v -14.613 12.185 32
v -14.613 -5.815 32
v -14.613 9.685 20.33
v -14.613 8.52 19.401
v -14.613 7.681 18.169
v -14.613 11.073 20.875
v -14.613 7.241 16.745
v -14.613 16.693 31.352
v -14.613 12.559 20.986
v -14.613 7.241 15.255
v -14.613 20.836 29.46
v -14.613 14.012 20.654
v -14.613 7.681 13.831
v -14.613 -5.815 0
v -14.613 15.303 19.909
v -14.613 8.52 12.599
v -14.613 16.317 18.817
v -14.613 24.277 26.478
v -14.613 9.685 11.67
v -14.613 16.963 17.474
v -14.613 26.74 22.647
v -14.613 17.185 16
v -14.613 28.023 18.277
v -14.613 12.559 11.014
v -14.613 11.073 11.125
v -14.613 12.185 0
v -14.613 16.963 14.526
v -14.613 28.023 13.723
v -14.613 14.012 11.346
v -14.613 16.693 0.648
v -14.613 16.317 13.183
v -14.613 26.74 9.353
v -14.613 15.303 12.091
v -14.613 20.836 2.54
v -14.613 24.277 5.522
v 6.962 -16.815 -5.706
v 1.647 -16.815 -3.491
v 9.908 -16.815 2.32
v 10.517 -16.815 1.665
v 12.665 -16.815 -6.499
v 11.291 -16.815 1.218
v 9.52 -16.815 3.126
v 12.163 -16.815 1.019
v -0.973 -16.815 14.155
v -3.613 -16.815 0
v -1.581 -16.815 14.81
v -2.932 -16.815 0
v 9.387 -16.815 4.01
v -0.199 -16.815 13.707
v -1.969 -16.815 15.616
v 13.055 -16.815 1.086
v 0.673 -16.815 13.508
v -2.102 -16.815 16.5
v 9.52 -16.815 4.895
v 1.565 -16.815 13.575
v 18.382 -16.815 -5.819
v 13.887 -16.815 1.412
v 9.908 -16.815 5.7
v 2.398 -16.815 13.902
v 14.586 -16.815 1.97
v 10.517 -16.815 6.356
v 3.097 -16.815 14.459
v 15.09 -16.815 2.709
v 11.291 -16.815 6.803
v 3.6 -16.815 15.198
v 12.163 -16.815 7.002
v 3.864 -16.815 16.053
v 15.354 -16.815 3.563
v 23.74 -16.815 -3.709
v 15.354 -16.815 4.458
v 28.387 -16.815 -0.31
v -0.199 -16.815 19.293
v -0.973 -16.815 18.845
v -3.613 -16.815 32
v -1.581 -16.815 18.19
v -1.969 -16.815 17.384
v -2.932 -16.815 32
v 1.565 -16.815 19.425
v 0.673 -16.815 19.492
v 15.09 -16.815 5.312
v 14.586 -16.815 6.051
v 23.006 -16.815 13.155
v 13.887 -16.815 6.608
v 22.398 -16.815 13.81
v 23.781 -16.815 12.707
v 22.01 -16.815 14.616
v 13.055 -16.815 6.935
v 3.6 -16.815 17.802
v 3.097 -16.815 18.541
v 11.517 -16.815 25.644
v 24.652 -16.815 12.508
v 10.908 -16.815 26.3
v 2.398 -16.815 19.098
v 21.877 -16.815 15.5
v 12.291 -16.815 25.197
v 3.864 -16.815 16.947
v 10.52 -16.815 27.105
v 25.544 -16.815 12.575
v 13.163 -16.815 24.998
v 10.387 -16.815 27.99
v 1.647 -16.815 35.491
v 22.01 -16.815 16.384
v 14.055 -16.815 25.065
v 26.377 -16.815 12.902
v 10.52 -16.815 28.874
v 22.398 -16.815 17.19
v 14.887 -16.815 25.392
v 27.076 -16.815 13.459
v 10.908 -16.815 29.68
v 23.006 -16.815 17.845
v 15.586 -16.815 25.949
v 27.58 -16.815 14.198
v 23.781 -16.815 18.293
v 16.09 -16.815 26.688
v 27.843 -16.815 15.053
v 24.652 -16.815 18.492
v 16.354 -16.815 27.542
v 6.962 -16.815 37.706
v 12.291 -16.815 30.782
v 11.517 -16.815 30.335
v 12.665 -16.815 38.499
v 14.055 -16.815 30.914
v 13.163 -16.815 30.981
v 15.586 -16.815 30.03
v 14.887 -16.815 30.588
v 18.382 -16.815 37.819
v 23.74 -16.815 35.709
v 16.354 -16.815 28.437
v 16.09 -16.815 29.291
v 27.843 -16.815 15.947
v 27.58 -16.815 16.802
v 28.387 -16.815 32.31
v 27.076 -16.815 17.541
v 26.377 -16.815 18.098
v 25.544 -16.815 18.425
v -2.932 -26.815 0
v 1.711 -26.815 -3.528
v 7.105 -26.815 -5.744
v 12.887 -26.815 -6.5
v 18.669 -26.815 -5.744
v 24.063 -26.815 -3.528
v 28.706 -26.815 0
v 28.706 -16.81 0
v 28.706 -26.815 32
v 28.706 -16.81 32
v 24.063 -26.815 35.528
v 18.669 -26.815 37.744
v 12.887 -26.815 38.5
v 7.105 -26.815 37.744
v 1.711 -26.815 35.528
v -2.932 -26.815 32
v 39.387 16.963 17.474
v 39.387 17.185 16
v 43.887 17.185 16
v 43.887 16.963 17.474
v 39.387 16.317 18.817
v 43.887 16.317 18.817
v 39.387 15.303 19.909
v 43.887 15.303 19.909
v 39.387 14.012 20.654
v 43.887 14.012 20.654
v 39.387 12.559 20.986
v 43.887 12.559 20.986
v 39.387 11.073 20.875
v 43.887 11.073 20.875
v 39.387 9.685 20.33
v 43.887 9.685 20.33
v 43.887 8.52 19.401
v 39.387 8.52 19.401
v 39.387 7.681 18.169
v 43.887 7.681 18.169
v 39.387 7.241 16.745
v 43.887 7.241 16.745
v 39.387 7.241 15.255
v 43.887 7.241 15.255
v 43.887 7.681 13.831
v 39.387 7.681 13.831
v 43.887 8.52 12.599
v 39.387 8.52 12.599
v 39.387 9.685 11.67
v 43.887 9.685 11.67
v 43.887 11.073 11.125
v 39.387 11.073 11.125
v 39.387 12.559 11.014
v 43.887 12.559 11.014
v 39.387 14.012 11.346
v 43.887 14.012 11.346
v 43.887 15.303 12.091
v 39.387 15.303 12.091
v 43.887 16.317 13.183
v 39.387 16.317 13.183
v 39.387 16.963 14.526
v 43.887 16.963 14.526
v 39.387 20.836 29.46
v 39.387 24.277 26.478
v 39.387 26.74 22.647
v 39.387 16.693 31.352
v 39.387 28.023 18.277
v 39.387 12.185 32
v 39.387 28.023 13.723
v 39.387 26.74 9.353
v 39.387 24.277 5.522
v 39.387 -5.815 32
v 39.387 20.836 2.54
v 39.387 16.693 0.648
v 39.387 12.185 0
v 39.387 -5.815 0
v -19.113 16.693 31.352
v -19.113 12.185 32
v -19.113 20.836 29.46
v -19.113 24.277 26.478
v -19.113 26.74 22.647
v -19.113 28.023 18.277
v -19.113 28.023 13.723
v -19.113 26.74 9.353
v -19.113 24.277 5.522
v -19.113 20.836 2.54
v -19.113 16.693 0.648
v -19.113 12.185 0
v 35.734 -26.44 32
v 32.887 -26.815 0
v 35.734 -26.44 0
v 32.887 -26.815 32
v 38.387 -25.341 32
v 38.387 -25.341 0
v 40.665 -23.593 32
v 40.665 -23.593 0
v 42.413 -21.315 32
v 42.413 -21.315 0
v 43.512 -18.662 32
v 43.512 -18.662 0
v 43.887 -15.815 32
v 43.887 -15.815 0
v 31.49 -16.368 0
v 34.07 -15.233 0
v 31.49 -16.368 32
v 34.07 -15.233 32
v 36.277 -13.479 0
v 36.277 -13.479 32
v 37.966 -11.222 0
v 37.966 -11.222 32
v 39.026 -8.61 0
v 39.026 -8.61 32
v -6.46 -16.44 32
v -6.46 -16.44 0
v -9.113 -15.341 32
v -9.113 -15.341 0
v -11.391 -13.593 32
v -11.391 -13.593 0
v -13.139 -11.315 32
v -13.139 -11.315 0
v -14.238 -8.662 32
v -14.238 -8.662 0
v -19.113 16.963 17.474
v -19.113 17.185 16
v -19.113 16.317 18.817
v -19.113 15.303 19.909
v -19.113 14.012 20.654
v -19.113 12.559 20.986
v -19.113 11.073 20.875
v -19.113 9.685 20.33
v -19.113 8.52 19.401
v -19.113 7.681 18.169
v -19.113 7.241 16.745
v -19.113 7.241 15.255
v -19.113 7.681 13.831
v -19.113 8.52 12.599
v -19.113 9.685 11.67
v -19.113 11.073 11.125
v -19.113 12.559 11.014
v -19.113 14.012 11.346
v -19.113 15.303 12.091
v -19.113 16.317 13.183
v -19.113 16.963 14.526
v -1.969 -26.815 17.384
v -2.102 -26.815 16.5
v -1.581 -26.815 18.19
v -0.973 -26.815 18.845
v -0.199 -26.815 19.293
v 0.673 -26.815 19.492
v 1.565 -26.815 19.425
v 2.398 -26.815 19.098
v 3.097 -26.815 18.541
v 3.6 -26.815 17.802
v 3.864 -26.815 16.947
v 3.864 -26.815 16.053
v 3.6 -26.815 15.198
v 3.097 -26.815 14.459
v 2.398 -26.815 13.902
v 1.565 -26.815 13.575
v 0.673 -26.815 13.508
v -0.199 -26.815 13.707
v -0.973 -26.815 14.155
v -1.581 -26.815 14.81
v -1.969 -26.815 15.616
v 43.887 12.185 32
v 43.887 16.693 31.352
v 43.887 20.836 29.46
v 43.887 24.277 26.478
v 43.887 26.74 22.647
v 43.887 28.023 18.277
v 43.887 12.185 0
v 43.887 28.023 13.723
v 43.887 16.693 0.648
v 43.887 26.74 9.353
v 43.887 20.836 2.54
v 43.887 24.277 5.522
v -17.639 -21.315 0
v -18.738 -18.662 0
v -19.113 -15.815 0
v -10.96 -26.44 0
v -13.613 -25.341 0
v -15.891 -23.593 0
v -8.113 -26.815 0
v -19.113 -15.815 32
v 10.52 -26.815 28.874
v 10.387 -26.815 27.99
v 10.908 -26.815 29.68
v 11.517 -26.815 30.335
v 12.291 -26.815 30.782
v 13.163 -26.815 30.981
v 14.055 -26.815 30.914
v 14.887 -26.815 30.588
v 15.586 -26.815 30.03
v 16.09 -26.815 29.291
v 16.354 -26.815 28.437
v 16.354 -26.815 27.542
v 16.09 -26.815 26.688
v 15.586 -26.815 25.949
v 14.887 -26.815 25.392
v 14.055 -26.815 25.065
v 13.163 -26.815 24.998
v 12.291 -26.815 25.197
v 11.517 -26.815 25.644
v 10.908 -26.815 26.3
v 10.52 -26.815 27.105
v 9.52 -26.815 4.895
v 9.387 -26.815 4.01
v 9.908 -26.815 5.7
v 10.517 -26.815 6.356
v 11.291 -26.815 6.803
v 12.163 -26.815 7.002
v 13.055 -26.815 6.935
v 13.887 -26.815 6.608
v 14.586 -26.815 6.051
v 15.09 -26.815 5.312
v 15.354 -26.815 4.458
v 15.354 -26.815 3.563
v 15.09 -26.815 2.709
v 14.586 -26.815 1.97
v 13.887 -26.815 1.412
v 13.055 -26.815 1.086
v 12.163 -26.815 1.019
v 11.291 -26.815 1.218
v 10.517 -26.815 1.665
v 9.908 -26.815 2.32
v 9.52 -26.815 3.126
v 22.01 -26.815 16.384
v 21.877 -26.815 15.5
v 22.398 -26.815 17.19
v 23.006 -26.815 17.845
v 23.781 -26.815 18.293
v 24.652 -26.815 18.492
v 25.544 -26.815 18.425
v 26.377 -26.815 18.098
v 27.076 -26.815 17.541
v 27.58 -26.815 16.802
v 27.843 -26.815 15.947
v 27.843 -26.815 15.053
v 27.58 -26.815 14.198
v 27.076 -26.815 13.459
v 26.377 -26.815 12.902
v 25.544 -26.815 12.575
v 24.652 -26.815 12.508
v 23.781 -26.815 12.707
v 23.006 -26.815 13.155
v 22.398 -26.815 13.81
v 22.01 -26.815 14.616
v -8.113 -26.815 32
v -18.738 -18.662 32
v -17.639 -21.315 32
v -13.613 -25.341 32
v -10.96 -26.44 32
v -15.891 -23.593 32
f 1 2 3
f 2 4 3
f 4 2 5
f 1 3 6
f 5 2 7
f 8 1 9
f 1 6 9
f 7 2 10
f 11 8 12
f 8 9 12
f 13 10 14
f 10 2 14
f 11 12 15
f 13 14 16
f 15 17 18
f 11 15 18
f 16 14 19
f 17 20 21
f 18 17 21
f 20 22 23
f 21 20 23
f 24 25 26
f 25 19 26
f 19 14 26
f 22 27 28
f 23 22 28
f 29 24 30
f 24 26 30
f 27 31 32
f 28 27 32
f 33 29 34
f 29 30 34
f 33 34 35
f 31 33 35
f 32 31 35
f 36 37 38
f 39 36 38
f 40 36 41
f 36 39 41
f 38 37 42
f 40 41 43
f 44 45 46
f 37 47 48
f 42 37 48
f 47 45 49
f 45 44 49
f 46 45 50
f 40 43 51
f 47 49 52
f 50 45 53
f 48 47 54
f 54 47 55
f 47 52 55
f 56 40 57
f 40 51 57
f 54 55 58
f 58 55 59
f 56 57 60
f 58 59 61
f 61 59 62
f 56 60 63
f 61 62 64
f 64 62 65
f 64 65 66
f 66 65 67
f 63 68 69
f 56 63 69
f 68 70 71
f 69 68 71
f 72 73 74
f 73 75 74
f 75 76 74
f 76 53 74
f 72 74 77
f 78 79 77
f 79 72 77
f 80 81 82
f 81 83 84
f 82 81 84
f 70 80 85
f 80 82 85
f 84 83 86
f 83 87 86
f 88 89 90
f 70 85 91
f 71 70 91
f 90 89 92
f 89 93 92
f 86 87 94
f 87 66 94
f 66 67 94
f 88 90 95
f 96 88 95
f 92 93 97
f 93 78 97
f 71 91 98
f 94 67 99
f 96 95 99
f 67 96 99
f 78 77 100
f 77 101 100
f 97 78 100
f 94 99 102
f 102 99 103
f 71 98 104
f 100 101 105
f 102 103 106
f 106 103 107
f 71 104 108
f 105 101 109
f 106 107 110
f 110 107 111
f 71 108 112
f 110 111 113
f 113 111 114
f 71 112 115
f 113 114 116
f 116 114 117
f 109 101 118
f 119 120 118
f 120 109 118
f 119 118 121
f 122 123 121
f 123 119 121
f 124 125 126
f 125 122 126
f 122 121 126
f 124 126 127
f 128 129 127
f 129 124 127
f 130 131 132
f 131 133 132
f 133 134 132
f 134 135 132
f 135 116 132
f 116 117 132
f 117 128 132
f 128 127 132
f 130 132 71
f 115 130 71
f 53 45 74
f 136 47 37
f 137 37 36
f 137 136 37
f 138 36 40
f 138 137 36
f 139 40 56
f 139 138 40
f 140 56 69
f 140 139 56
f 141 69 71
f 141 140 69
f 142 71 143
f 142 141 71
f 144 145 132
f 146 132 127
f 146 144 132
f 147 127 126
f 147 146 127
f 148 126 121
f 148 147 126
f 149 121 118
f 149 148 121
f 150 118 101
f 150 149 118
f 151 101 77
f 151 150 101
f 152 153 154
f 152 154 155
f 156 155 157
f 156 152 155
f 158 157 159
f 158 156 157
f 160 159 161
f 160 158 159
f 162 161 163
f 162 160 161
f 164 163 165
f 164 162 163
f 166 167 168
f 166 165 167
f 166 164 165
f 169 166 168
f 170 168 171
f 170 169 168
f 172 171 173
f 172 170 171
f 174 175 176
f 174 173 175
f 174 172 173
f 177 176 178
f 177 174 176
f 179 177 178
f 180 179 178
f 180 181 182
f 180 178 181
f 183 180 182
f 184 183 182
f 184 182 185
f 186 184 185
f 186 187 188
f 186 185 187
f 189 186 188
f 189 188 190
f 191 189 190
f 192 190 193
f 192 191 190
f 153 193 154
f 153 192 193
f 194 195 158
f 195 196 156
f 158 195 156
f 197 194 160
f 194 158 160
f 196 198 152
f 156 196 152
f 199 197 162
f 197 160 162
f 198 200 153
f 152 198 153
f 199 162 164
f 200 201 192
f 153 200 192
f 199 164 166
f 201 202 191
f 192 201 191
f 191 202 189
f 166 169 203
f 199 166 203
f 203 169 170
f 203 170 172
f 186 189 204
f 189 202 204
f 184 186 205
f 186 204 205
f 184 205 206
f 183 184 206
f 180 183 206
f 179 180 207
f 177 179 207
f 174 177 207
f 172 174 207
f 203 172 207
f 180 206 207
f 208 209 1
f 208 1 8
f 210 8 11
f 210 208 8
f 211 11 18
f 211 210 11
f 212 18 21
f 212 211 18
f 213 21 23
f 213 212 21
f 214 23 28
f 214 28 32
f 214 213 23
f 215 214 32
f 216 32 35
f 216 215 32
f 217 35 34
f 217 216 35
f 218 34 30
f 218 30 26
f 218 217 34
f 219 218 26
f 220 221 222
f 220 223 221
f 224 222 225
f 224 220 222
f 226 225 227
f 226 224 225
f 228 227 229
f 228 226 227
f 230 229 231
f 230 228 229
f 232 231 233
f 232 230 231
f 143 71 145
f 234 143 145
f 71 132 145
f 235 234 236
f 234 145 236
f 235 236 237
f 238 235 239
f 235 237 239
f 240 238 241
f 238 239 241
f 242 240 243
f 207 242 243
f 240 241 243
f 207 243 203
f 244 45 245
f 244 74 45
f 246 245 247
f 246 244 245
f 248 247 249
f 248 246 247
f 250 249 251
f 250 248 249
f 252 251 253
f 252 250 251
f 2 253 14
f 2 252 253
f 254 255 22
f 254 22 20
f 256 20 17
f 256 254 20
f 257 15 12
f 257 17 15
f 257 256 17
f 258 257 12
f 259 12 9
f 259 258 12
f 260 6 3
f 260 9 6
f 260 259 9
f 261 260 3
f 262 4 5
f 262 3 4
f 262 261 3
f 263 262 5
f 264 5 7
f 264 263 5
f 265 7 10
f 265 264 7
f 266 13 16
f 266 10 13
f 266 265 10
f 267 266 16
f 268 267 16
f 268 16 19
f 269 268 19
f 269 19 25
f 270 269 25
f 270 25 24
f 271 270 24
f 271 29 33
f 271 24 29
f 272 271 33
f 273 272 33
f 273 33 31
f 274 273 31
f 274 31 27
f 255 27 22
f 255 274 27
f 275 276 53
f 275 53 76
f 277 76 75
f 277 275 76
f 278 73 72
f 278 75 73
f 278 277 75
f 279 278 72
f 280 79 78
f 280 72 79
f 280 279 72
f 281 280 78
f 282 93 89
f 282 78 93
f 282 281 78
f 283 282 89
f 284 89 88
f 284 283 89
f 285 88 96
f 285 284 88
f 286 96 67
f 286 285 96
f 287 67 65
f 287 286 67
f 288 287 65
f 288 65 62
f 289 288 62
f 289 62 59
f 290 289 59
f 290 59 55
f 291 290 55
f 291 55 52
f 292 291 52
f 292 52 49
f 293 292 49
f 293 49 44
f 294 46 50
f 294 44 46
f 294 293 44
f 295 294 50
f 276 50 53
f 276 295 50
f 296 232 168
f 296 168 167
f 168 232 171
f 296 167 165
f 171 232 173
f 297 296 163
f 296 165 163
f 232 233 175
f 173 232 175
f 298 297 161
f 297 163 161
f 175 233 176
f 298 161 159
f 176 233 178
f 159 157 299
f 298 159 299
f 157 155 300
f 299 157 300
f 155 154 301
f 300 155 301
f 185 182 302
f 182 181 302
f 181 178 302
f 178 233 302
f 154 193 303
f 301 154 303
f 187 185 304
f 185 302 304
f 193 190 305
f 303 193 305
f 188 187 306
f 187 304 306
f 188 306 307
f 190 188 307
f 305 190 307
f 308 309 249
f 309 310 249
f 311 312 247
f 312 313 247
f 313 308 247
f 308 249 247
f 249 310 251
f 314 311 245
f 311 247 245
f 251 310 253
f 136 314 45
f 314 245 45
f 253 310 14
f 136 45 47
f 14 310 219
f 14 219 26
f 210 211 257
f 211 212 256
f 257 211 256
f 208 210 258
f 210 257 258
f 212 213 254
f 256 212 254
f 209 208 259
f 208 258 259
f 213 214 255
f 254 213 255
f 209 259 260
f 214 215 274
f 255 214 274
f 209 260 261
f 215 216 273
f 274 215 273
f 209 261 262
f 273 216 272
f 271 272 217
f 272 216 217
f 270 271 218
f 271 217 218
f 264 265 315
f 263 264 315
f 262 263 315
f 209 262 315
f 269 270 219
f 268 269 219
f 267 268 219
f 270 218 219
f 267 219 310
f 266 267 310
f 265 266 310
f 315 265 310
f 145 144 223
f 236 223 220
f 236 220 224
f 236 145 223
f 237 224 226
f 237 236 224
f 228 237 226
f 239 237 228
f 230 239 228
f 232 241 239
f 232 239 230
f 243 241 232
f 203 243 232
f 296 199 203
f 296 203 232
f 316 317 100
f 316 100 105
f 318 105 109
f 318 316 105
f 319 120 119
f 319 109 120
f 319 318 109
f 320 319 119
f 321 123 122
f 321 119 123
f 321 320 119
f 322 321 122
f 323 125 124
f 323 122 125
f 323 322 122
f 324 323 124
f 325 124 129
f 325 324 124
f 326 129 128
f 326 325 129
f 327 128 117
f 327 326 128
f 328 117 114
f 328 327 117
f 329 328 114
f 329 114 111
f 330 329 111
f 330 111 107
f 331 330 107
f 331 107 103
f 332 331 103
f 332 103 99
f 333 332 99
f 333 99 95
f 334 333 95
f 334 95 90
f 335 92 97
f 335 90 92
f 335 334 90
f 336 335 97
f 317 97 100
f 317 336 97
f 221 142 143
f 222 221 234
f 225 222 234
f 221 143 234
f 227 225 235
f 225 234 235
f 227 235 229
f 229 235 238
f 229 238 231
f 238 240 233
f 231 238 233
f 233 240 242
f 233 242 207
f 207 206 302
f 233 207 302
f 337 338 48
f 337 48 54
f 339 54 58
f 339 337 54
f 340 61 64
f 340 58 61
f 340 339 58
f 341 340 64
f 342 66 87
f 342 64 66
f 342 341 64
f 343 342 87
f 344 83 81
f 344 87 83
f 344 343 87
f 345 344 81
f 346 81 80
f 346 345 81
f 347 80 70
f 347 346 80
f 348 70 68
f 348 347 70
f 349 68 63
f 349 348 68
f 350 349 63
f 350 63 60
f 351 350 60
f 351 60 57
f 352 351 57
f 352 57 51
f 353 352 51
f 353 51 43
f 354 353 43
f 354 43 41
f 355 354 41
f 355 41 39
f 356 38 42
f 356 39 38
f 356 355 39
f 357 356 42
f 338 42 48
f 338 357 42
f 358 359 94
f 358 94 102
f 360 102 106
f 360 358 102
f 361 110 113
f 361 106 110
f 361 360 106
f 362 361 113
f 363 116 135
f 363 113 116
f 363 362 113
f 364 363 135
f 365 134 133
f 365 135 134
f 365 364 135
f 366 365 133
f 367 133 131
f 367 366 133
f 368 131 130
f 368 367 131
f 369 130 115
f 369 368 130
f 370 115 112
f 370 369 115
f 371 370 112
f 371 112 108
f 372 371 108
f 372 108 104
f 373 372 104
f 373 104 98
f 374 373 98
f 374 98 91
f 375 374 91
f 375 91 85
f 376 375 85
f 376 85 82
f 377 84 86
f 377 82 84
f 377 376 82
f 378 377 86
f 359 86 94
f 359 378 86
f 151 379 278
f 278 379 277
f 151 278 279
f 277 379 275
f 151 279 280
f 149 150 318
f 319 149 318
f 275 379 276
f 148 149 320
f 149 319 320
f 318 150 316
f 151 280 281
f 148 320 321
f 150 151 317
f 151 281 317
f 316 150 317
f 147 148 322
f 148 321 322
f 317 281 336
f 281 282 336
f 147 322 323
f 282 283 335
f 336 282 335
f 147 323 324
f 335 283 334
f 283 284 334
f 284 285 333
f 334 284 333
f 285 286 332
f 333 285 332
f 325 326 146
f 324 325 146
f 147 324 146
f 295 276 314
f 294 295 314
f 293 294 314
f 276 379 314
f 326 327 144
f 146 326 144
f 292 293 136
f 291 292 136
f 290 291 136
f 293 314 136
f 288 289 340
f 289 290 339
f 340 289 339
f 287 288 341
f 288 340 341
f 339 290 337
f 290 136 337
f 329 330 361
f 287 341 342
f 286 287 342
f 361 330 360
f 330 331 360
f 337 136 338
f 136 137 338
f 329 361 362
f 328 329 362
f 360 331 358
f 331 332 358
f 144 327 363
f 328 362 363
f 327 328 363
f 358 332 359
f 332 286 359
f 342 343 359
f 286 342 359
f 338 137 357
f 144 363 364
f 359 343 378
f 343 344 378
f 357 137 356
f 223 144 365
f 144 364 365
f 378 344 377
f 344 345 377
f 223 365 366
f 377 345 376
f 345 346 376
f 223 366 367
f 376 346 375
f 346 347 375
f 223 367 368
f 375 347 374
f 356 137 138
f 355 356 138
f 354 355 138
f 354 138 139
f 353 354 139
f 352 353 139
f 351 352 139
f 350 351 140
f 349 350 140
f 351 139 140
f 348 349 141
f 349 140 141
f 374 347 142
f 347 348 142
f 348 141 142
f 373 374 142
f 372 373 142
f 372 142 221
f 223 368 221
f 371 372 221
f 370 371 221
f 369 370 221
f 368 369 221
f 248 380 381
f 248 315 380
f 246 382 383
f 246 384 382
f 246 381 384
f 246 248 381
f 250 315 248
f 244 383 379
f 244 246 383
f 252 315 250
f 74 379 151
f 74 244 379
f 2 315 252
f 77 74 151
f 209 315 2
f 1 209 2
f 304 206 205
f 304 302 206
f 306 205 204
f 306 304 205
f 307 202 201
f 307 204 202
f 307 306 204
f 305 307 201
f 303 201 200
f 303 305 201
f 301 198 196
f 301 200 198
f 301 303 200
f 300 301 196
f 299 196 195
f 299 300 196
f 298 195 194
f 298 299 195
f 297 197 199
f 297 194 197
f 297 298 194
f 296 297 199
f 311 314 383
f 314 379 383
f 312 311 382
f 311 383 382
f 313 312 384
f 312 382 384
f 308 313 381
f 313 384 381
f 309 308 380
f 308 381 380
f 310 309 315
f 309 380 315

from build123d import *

# Parameters (mm, degrees)
BOSS_EXTRUDE1_DEPTH     = 32
SKETCH2_R               = 22.5
BOSS_EXTRUDE4_DEPTH     = 10
CUT_EXTRUDE1_DEPTH      = 80.029560932
CUT_EXTRUDE1_DEPTH_BACK = 80.029560932
SKETCH3_R               = 5
FILLET3_R               = 11
FILLET4_RADIUS          = 16
FILLET4_LENGTH          = 4.5
FILLET5_RADIUS          = 16
FILLET5_LENGTH          = 4.5
CUT_EXTRUDE2_DEPTH      = 74.711106836
CUT_EXTRUDE2_DEPTH_BACK = 74.711106836
SKETCH4_R               = 3


with BuildPart() as part:
    # Sketch1 → Boss-Extrude1 (new body)
    with BuildSketch(Plane.XY):
        Polygon((-19.112903226, 28.185483871), (-19.112903226, -26.814516129), (43.887096774, -26.814516129), (43.887096774, 28.185483871), (39.387096774, 28.185483871), (39.387096774, -16.814516129), (-14.612903226, -16.814516129), (-14.612903226, 28.185483871), align=None)
    extrude(amount=BOSS_EXTRUDE1_DEPTH)

    # Sketch2 → Boss-Extrude4 (add)
    with BuildSketch(Plane.XZ.offset(26.814516129)):
        with Locations((12.887096774, 16)):
            Circle(SKETCH2_R)
    extrude(amount=-BOSS_EXTRUDE4_DEPTH)

    # Sketch3 → Cut-Extrude1 (cut, two sides: drawn at the far end of the back side and taken through both)
    with BuildSketch(Plane(origin=(43.887096774, 0, 0), x_dir=(0, 0, -1), z_dir=(1, 0, 0)).offset(-CUT_EXTRUDE1_DEPTH_BACK)):
        with Locations(Location((-16, 12.185483871, 0), (0, 0, 90))):
            Circle(SKETCH3_R)
    extrude(amount=CUT_EXTRUDE1_DEPTH + CUT_EXTRUDE1_DEPTH_BACK, mode=Mode.SUBTRACT)

    # Fillet3
    fillet3_edges = [part.edges().sort_by_distance(p)[0] for p in [
        (-14.612903226, -16.814516129, 16),
        (39.387096774, -16.814516129, 16),
        (43.887096774, -26.814516129, 16),
        (-19.112903226, -26.814516129, 16),
    ]]
    fillet(fillet3_edges, radius=FILLET3_R)

    # Fillet4: full round fillet: the end face becomes a half cylinder, R = half its width
    fillet4_face = Plane((41.637096774, 28.185483871, 16), x_dir=(1, 0, 0), z_dir=(0, 1, 0))  # on the end face: x along it, z out of the body
    fillet4_slab = fillet4_face.offset(-FILLET4_RADIUS / 2) * Box(FILLET4_LENGTH, 2 * FILLET4_RADIUS, FILLET4_RADIUS, mode=Mode.PRIVATE)  # the body's end, R deep
    fillet4_round = Plane((41.637096774, 12.185483871, 16), x_dir=(0, 1, 0), z_dir=(1, 0, 0)) * Cylinder(FILLET4_RADIUS, FILLET4_LENGTH, mode=Mode.PRIVATE)  # its axis R under the face
    add(fillet4_slab - fillet4_round, mode=Mode.SUBTRACT)

    # Fillet5: full round fillet: the end face becomes a half cylinder, R = half its width
    fillet5_face = Plane((-16.862903226, 28.185483871, 16), x_dir=(-1, 0, 0), z_dir=(0, 1, 0))  # on the end face: x along it, z out of the body
    fillet5_slab = fillet5_face.offset(-FILLET5_RADIUS / 2) * Box(FILLET5_LENGTH, 2 * FILLET5_RADIUS, FILLET5_RADIUS, mode=Mode.PRIVATE)  # the body's end, R deep
    fillet5_round = Plane((-16.862903226, 12.185483871, 16), x_dir=(0, 1, 0), z_dir=(-1, 0, 0)) * Cylinder(FILLET5_RADIUS, FILLET5_LENGTH, mode=Mode.PRIVATE)  # its axis R under the face
    add(fillet5_slab - fillet5_round, mode=Mode.SUBTRACT)

    # Sketch4 → Cut-Extrude2 (cut, two sides: drawn at the far end of the back side and taken through both)
    with BuildSketch(Plane(origin=(0, -16.814516129, 0), x_dir=(1, 0, 0), z_dir=(0, 1, 0)).offset(-CUT_EXTRUDE2_DEPTH_BACK)):
        with Locations(Location((12.387096774, -4.010421192, 0), (0, 0, 180))):
            Circle(SKETCH4_R)
        with Locations(Location((24.876675582, -15.5, 0), (0, 0, 180))):
            Circle(SKETCH4_R)
        with Locations(Location((13.387096774, -27.989578808, 0), (0, 0, 180))):
            Circle(SKETCH4_R)
        with Locations(Location((0.897517966, -16.5, 0), (0, 0, 180))):
            Circle(SKETCH4_R)
    extrude(amount=CUT_EXTRUDE2_DEPTH + CUT_EXTRUDE2_DEPTH_BACK, mode=Mode.SUBTRACT)


solid = part.part
